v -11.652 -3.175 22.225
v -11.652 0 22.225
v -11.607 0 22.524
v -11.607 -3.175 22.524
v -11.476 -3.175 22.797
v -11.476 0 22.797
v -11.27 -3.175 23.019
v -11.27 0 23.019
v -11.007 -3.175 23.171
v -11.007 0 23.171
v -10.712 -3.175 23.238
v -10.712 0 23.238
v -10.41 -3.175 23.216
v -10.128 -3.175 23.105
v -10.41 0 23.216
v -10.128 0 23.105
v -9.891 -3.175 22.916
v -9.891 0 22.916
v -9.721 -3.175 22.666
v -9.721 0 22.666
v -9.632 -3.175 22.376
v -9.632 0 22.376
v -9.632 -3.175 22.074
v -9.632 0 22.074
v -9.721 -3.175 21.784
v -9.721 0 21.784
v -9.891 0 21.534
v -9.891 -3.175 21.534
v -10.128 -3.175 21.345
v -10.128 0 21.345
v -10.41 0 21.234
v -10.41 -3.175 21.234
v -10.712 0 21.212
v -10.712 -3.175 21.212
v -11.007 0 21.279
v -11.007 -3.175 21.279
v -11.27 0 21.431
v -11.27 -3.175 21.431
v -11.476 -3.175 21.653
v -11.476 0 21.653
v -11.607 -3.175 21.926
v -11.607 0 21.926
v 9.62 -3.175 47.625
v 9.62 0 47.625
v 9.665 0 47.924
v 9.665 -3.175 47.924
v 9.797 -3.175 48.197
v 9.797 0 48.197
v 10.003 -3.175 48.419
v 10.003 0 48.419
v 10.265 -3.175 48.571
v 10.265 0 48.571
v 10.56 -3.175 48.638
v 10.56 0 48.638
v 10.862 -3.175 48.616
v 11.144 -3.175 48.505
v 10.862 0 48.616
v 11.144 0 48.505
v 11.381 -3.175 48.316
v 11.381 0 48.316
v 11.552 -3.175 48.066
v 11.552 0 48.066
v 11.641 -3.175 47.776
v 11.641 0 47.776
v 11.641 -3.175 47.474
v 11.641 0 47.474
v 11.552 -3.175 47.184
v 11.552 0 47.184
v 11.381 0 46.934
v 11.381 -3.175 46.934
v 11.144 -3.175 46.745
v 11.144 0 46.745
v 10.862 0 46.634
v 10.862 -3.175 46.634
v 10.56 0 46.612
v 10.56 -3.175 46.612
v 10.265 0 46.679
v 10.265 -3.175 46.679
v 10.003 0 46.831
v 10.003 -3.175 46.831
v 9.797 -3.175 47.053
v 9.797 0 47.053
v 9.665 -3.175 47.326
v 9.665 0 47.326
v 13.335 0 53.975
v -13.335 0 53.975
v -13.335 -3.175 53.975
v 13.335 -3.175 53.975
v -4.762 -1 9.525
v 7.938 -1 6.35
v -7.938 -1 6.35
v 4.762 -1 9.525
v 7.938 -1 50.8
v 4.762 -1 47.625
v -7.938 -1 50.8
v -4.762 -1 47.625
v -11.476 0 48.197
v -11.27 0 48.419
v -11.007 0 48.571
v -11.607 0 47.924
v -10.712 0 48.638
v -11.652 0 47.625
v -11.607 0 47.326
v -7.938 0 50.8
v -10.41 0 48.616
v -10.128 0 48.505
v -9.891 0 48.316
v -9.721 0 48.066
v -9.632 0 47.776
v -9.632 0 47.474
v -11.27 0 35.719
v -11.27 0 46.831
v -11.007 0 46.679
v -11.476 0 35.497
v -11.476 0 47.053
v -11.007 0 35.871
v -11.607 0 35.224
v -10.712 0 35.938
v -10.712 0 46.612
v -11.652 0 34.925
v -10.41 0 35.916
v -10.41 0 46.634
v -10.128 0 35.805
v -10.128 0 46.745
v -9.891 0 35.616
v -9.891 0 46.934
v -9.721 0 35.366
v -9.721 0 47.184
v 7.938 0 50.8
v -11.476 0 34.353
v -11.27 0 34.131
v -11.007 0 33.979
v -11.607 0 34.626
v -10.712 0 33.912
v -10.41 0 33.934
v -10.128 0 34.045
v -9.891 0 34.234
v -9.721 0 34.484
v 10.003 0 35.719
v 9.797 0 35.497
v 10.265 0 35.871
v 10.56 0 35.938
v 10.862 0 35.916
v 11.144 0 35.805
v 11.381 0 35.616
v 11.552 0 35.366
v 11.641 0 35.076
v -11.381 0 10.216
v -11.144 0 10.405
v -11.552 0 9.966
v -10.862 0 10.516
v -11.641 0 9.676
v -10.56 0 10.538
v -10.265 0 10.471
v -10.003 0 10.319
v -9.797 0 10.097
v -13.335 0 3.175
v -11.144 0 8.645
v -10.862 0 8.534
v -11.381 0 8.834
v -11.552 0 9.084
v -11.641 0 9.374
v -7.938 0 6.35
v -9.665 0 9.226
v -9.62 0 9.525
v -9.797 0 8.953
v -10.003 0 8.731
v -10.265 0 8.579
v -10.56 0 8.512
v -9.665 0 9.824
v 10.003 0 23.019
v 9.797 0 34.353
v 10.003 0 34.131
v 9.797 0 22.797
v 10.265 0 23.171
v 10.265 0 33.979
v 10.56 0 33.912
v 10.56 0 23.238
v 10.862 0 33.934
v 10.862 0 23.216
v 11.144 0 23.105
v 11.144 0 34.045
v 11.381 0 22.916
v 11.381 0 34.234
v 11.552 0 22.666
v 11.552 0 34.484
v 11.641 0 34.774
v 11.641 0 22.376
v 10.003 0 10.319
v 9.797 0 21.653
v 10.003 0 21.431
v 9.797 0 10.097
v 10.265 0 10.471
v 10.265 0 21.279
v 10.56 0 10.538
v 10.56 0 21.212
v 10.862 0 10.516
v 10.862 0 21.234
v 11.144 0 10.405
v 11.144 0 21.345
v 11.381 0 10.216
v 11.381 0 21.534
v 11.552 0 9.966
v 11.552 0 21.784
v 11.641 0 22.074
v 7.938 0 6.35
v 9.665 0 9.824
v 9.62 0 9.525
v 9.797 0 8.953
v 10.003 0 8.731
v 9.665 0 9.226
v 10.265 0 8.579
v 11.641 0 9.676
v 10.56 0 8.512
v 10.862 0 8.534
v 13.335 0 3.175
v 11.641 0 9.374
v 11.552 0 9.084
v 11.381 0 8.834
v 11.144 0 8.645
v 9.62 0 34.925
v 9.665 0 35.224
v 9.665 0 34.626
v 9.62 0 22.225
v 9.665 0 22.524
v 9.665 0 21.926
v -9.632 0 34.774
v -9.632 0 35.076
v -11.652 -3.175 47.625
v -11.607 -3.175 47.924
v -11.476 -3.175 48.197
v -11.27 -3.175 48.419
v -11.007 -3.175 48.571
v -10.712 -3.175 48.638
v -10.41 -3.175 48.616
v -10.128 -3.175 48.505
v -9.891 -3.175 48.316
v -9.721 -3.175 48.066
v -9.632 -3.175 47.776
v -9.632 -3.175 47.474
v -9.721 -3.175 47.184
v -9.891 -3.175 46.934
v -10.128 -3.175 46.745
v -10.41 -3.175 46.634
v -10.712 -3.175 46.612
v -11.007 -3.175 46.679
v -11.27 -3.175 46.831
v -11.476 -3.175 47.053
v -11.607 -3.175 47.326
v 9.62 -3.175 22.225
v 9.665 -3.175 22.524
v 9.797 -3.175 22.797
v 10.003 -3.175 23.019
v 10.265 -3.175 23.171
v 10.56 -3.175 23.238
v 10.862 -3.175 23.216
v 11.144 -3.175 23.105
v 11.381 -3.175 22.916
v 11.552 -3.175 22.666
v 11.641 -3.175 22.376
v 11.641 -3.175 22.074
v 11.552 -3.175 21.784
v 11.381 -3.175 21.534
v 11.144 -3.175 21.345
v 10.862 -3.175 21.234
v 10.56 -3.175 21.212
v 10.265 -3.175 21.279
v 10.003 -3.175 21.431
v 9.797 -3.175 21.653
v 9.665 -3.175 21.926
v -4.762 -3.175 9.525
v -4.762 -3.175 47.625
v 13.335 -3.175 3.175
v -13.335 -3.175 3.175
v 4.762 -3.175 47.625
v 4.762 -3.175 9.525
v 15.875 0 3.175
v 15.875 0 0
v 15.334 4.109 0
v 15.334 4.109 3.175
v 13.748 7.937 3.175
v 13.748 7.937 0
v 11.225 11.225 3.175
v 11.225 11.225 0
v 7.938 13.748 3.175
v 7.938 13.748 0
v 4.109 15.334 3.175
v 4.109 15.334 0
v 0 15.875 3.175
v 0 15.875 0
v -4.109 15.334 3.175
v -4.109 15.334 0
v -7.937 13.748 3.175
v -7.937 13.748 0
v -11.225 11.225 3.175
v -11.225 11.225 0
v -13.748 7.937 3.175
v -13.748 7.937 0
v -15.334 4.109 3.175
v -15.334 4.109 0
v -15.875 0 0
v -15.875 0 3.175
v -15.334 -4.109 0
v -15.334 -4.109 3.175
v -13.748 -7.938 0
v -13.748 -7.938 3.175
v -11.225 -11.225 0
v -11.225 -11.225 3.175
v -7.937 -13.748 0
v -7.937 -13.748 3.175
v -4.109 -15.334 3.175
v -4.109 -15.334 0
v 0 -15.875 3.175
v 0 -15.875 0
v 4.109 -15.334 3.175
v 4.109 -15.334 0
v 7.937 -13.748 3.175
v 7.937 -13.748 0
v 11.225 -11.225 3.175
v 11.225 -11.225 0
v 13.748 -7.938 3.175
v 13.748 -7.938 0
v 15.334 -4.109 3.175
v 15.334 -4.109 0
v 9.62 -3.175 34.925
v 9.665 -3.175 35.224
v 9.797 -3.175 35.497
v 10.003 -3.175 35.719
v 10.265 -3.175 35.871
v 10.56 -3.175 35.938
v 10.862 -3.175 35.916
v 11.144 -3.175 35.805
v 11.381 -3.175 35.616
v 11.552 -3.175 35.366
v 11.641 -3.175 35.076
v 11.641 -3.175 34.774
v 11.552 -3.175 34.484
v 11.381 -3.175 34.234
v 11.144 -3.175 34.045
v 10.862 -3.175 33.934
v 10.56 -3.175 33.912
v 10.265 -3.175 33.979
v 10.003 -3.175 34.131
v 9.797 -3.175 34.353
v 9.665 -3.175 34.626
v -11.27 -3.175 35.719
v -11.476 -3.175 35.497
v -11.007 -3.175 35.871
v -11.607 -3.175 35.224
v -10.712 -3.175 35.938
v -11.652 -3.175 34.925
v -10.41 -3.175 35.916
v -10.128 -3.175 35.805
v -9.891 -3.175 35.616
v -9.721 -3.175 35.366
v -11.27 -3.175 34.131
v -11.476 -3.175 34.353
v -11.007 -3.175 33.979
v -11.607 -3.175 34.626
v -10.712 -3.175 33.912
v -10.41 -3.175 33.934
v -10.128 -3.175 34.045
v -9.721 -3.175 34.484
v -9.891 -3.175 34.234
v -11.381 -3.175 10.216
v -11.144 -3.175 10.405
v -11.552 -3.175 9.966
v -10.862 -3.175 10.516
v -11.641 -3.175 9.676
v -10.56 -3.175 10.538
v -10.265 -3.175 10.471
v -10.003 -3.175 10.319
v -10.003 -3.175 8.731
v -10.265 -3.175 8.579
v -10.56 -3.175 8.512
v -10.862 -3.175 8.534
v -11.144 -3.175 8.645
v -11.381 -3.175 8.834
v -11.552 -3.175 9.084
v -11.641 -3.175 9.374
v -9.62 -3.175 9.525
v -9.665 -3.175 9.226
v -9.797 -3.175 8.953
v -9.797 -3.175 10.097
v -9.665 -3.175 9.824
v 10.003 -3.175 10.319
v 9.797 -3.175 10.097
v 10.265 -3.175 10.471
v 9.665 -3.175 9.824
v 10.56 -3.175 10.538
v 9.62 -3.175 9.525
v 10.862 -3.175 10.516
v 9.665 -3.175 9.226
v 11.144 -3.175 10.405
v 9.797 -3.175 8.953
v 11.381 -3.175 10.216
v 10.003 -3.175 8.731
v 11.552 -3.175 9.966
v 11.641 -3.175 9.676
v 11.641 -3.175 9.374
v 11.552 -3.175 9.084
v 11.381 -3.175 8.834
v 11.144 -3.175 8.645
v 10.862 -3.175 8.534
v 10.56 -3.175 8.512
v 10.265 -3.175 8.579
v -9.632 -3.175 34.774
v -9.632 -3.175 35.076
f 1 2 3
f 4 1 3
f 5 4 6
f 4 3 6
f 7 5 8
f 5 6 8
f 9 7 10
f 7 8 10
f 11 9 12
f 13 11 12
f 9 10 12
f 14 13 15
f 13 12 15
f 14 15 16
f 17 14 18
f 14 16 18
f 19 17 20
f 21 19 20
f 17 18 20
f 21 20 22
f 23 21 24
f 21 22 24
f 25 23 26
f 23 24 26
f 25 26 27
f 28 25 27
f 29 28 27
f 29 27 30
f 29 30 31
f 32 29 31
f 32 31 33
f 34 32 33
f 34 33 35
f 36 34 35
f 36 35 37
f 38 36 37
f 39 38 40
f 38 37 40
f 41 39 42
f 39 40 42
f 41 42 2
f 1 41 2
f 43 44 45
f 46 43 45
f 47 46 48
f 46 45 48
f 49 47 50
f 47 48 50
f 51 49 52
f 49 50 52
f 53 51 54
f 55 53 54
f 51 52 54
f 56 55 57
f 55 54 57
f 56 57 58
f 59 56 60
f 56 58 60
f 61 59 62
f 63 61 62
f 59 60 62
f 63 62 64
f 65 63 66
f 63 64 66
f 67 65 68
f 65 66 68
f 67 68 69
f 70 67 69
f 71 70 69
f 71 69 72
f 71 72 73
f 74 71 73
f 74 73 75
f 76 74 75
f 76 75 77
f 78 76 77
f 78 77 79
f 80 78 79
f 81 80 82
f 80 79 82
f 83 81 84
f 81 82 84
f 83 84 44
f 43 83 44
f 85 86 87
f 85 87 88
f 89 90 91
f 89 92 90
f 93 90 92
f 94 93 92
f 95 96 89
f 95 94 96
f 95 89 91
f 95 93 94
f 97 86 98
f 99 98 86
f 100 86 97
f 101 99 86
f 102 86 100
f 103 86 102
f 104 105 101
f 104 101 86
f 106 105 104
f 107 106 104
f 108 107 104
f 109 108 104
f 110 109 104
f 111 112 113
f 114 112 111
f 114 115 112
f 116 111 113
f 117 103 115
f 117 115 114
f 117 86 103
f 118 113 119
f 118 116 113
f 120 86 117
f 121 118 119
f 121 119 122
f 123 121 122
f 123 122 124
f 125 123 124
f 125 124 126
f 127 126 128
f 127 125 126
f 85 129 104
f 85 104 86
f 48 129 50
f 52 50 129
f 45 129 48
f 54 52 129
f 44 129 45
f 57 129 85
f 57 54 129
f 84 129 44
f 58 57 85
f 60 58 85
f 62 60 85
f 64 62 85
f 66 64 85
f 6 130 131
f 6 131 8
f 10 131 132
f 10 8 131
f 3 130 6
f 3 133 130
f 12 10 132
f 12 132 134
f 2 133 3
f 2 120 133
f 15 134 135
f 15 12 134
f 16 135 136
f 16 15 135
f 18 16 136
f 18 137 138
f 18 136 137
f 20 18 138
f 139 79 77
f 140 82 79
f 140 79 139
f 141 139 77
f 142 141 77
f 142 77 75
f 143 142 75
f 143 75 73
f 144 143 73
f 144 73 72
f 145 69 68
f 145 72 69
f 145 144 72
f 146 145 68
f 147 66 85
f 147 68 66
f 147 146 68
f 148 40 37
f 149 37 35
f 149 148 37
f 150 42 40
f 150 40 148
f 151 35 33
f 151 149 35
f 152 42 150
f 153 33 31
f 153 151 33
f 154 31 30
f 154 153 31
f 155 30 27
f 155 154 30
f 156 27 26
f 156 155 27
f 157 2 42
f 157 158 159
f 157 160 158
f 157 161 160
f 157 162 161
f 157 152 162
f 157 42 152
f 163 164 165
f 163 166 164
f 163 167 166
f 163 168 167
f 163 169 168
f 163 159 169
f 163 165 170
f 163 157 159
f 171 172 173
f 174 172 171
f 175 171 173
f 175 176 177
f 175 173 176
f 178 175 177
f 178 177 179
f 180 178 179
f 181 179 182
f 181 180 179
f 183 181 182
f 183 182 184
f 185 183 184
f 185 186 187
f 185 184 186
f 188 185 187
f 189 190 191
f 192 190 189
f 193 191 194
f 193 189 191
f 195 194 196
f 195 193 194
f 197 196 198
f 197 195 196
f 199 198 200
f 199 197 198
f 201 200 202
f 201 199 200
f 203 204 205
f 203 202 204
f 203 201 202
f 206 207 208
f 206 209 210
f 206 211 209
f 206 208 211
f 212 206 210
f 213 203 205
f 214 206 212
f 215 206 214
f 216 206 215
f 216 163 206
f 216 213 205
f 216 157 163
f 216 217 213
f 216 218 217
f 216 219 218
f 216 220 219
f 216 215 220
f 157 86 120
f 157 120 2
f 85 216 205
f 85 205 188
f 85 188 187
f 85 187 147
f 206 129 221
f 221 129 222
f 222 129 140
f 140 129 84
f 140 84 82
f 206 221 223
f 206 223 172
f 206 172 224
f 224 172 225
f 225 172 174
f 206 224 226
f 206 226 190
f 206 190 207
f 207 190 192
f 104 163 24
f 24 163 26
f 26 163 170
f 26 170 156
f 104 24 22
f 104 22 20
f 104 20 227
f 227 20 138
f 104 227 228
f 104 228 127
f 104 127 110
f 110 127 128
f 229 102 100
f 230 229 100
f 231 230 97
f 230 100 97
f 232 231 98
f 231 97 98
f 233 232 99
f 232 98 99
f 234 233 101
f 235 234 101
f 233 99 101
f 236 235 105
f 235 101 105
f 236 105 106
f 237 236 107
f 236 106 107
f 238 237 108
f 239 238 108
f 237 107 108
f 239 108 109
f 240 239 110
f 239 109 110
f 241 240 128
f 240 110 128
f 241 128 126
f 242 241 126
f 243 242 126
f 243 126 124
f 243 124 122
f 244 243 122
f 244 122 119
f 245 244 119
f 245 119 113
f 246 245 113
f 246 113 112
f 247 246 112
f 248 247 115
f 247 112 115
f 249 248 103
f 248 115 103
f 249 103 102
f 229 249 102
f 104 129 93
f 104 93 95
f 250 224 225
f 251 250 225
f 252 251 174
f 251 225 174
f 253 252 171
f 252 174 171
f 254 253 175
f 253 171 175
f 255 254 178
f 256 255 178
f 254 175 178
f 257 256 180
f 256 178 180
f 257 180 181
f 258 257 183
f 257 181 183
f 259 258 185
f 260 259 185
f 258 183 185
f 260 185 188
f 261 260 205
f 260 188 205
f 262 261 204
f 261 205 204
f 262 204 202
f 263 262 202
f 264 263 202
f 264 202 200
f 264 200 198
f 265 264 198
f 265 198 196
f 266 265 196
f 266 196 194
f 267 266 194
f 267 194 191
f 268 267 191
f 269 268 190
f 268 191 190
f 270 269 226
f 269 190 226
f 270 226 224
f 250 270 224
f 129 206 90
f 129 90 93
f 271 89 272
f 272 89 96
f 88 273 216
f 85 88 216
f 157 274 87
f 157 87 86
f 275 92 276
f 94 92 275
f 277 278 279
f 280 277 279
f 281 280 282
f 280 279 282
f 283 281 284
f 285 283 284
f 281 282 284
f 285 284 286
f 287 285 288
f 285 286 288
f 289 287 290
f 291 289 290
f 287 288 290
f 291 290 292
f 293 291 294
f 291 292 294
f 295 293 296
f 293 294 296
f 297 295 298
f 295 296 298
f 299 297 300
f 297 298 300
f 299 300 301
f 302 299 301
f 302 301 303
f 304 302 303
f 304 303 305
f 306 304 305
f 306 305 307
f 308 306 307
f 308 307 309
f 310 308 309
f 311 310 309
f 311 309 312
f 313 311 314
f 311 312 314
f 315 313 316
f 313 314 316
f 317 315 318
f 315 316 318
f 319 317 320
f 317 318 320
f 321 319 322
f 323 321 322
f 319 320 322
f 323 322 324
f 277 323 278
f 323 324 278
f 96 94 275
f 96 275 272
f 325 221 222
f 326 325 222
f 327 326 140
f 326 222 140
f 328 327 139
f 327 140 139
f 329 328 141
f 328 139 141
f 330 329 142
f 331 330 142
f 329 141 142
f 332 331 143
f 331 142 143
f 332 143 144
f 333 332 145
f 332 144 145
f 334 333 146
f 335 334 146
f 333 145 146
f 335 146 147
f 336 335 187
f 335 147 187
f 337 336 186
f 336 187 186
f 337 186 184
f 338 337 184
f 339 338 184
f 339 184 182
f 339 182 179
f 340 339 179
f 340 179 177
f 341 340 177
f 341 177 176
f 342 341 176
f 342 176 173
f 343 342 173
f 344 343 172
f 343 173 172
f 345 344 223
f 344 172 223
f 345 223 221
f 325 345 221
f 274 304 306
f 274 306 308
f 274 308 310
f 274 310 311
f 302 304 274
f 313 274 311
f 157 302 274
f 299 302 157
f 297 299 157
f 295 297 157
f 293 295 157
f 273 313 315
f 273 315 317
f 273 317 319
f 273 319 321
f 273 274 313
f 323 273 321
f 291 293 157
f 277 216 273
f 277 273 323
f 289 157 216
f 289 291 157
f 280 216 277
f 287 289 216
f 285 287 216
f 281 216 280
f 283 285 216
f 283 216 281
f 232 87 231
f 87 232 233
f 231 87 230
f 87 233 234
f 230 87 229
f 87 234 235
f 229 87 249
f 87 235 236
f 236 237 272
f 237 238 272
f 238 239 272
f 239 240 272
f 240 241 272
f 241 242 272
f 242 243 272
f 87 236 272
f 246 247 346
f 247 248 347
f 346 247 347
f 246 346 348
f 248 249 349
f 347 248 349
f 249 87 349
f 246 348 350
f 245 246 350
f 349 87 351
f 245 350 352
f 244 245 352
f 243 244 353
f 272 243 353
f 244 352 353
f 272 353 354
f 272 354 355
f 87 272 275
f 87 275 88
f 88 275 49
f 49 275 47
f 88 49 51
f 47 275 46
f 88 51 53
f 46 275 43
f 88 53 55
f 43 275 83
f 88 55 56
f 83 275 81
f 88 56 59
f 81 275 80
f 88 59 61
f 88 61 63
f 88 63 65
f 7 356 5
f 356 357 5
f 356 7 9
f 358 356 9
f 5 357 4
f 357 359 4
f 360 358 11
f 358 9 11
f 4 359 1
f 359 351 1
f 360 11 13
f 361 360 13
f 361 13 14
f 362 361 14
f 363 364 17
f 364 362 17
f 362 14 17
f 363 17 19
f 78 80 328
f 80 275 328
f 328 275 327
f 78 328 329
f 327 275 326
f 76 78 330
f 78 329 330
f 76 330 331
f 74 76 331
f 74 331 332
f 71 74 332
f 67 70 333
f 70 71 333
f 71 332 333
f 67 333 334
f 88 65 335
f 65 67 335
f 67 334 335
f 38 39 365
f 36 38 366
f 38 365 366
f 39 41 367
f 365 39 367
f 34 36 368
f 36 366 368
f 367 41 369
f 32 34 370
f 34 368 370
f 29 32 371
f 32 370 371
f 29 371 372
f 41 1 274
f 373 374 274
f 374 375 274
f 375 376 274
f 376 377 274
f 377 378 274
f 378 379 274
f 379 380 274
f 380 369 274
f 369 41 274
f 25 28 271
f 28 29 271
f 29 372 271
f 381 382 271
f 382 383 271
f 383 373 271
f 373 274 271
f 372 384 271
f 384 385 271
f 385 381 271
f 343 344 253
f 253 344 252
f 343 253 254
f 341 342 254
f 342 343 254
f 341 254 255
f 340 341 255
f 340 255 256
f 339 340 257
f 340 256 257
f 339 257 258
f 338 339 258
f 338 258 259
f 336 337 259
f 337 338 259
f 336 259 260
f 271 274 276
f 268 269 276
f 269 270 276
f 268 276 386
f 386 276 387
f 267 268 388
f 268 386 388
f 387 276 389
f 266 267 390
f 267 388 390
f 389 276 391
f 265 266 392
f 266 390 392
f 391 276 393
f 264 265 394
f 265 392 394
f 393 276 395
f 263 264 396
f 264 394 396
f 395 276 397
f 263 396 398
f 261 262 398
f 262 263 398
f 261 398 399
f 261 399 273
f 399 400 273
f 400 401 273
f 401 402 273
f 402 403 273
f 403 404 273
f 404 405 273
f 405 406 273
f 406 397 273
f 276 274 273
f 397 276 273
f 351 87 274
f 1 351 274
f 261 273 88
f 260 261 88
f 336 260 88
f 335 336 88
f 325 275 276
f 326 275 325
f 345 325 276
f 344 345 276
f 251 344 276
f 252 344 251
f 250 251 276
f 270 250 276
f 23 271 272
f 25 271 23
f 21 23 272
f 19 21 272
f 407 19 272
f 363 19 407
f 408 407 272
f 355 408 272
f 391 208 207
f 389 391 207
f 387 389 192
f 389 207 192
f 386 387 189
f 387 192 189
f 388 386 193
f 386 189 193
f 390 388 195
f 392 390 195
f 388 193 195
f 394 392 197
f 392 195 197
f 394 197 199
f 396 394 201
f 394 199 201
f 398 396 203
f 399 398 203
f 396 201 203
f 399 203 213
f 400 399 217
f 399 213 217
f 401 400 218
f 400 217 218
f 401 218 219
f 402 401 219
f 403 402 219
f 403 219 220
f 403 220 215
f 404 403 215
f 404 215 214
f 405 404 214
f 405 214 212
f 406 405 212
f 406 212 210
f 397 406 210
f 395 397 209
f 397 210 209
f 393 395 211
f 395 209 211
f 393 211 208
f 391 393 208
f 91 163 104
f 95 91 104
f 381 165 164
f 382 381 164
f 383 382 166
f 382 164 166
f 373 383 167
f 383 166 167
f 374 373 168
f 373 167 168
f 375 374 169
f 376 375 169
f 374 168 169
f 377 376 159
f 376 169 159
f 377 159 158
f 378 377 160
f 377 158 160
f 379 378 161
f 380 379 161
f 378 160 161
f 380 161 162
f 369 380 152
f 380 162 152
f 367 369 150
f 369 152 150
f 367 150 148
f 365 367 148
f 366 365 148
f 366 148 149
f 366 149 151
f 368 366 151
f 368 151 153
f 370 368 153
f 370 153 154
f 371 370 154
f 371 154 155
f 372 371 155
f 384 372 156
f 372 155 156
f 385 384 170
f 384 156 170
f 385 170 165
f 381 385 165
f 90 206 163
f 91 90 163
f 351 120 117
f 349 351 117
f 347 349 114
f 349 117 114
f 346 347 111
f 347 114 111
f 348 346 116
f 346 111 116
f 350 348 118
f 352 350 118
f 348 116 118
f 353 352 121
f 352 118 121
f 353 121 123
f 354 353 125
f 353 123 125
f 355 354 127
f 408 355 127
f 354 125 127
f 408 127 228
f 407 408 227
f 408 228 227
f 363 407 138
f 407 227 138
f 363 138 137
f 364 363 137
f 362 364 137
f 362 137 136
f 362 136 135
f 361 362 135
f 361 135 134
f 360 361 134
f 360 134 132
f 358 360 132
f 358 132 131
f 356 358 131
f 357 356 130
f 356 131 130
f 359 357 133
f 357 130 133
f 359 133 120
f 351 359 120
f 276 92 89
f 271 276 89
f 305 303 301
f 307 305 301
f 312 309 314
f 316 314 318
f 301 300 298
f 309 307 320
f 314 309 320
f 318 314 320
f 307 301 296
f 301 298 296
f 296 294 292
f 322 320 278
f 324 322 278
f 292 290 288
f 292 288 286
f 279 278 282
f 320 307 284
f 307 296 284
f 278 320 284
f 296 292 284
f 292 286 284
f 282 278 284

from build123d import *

# Parameters (mm, degrees)
F0_R     = 15.875
F1_DEPTH = 3.175
F2_W     = 26.67
F2_H     = 3.175
F3_DEPTH = 50.8
F4_W     = 9.525
F4_H     = 38.1
F5_DEPTH = 3.175
F6_W     = 15.875
F6_H     = 44.45
F7_DEPTH = 1
F8_R     = 1.016
F9_DEPTH = 3.175


with BuildPart() as f1:
    # F0 (on Top) → F1 (new body)
    with BuildSketch(Plane.XY):
        Circle(F0_R)
    extrude(amount=F1_DEPTH)

    # F2 (on face) → F3 (join)
    with BuildSketch(Plane.XY.offset(3.175)):
        with Locations((0, -1.5875)):
            Rectangle(F2_W, F2_H)
    extrude(amount=F3_DEPTH)

    # F4 (on face) → F5 (cut, through all)
    with BuildSketch(Plane(origin=(0, 0, 0), x_dir=(-1, 0, 0), z_dir=(0, 1, 0))):
        with Locations((0, 28.575)):
            Rectangle(F4_W, F4_H)
    extrude(amount=-F5_DEPTH, mode=Mode.SUBTRACT)

    # F6 (on face) → F7 (cut)
    with BuildSketch(Plane(origin=(0, 0, 0), x_dir=(-1, 0, 0), z_dir=(0, 1, 0))):
        with Locations((0, 28.575)):
            Rectangle(F6_W, F6_H)
    extrude(amount=-F7_DEPTH, mode=Mode.SUBTRACT)

    # F8 (on face) → F9 (cut, through all)
    with BuildSketch(Plane(origin=(0, 0, 0), x_dir=(-1, 0, 0), z_dir=(0, 1, 0))):
        with BuildLine():
            Line((10.63625, 9.525), (11.65225, 9.525))
            ThreePointArc((11.65225, 9.525), (10.63625, 10.541), (9.62025, 9.525))
            Line((9.62025, 9.525), (10.63625, 9.525))
        make_face()
        with BuildLine():
            ThreePointArc((9.62025, 9.525), (10.63625, 8.509), (11.65225, 9.525))
            Line((11.65225, 9.525), (10.63625, 9.525))
            Line((10.63625, 9.525), (9.62025, 9.525))
        make_face()
        with Locations((10.63625, 22.225)):
            Circle(F8_R)
        with Locations((10.63625, 34.925)):
            Circle(F8_R)
        with Locations((10.63625, 47.625)):
            Circle(F8_R)
        with Locations((-10.63625, 47.625)):
            Circle(F8_R)
        with Locations((-10.63625, 34.925)):
            Circle(F8_R)
        with Locations((-10.63625, 22.225)):
            Circle(F8_R)
        with Locations((-10.63625, 9.525)):
            Circle(F8_R)
    extrude(amount=-F9_DEPTH, mode=Mode.SUBTRACT)


solid = f1.part
